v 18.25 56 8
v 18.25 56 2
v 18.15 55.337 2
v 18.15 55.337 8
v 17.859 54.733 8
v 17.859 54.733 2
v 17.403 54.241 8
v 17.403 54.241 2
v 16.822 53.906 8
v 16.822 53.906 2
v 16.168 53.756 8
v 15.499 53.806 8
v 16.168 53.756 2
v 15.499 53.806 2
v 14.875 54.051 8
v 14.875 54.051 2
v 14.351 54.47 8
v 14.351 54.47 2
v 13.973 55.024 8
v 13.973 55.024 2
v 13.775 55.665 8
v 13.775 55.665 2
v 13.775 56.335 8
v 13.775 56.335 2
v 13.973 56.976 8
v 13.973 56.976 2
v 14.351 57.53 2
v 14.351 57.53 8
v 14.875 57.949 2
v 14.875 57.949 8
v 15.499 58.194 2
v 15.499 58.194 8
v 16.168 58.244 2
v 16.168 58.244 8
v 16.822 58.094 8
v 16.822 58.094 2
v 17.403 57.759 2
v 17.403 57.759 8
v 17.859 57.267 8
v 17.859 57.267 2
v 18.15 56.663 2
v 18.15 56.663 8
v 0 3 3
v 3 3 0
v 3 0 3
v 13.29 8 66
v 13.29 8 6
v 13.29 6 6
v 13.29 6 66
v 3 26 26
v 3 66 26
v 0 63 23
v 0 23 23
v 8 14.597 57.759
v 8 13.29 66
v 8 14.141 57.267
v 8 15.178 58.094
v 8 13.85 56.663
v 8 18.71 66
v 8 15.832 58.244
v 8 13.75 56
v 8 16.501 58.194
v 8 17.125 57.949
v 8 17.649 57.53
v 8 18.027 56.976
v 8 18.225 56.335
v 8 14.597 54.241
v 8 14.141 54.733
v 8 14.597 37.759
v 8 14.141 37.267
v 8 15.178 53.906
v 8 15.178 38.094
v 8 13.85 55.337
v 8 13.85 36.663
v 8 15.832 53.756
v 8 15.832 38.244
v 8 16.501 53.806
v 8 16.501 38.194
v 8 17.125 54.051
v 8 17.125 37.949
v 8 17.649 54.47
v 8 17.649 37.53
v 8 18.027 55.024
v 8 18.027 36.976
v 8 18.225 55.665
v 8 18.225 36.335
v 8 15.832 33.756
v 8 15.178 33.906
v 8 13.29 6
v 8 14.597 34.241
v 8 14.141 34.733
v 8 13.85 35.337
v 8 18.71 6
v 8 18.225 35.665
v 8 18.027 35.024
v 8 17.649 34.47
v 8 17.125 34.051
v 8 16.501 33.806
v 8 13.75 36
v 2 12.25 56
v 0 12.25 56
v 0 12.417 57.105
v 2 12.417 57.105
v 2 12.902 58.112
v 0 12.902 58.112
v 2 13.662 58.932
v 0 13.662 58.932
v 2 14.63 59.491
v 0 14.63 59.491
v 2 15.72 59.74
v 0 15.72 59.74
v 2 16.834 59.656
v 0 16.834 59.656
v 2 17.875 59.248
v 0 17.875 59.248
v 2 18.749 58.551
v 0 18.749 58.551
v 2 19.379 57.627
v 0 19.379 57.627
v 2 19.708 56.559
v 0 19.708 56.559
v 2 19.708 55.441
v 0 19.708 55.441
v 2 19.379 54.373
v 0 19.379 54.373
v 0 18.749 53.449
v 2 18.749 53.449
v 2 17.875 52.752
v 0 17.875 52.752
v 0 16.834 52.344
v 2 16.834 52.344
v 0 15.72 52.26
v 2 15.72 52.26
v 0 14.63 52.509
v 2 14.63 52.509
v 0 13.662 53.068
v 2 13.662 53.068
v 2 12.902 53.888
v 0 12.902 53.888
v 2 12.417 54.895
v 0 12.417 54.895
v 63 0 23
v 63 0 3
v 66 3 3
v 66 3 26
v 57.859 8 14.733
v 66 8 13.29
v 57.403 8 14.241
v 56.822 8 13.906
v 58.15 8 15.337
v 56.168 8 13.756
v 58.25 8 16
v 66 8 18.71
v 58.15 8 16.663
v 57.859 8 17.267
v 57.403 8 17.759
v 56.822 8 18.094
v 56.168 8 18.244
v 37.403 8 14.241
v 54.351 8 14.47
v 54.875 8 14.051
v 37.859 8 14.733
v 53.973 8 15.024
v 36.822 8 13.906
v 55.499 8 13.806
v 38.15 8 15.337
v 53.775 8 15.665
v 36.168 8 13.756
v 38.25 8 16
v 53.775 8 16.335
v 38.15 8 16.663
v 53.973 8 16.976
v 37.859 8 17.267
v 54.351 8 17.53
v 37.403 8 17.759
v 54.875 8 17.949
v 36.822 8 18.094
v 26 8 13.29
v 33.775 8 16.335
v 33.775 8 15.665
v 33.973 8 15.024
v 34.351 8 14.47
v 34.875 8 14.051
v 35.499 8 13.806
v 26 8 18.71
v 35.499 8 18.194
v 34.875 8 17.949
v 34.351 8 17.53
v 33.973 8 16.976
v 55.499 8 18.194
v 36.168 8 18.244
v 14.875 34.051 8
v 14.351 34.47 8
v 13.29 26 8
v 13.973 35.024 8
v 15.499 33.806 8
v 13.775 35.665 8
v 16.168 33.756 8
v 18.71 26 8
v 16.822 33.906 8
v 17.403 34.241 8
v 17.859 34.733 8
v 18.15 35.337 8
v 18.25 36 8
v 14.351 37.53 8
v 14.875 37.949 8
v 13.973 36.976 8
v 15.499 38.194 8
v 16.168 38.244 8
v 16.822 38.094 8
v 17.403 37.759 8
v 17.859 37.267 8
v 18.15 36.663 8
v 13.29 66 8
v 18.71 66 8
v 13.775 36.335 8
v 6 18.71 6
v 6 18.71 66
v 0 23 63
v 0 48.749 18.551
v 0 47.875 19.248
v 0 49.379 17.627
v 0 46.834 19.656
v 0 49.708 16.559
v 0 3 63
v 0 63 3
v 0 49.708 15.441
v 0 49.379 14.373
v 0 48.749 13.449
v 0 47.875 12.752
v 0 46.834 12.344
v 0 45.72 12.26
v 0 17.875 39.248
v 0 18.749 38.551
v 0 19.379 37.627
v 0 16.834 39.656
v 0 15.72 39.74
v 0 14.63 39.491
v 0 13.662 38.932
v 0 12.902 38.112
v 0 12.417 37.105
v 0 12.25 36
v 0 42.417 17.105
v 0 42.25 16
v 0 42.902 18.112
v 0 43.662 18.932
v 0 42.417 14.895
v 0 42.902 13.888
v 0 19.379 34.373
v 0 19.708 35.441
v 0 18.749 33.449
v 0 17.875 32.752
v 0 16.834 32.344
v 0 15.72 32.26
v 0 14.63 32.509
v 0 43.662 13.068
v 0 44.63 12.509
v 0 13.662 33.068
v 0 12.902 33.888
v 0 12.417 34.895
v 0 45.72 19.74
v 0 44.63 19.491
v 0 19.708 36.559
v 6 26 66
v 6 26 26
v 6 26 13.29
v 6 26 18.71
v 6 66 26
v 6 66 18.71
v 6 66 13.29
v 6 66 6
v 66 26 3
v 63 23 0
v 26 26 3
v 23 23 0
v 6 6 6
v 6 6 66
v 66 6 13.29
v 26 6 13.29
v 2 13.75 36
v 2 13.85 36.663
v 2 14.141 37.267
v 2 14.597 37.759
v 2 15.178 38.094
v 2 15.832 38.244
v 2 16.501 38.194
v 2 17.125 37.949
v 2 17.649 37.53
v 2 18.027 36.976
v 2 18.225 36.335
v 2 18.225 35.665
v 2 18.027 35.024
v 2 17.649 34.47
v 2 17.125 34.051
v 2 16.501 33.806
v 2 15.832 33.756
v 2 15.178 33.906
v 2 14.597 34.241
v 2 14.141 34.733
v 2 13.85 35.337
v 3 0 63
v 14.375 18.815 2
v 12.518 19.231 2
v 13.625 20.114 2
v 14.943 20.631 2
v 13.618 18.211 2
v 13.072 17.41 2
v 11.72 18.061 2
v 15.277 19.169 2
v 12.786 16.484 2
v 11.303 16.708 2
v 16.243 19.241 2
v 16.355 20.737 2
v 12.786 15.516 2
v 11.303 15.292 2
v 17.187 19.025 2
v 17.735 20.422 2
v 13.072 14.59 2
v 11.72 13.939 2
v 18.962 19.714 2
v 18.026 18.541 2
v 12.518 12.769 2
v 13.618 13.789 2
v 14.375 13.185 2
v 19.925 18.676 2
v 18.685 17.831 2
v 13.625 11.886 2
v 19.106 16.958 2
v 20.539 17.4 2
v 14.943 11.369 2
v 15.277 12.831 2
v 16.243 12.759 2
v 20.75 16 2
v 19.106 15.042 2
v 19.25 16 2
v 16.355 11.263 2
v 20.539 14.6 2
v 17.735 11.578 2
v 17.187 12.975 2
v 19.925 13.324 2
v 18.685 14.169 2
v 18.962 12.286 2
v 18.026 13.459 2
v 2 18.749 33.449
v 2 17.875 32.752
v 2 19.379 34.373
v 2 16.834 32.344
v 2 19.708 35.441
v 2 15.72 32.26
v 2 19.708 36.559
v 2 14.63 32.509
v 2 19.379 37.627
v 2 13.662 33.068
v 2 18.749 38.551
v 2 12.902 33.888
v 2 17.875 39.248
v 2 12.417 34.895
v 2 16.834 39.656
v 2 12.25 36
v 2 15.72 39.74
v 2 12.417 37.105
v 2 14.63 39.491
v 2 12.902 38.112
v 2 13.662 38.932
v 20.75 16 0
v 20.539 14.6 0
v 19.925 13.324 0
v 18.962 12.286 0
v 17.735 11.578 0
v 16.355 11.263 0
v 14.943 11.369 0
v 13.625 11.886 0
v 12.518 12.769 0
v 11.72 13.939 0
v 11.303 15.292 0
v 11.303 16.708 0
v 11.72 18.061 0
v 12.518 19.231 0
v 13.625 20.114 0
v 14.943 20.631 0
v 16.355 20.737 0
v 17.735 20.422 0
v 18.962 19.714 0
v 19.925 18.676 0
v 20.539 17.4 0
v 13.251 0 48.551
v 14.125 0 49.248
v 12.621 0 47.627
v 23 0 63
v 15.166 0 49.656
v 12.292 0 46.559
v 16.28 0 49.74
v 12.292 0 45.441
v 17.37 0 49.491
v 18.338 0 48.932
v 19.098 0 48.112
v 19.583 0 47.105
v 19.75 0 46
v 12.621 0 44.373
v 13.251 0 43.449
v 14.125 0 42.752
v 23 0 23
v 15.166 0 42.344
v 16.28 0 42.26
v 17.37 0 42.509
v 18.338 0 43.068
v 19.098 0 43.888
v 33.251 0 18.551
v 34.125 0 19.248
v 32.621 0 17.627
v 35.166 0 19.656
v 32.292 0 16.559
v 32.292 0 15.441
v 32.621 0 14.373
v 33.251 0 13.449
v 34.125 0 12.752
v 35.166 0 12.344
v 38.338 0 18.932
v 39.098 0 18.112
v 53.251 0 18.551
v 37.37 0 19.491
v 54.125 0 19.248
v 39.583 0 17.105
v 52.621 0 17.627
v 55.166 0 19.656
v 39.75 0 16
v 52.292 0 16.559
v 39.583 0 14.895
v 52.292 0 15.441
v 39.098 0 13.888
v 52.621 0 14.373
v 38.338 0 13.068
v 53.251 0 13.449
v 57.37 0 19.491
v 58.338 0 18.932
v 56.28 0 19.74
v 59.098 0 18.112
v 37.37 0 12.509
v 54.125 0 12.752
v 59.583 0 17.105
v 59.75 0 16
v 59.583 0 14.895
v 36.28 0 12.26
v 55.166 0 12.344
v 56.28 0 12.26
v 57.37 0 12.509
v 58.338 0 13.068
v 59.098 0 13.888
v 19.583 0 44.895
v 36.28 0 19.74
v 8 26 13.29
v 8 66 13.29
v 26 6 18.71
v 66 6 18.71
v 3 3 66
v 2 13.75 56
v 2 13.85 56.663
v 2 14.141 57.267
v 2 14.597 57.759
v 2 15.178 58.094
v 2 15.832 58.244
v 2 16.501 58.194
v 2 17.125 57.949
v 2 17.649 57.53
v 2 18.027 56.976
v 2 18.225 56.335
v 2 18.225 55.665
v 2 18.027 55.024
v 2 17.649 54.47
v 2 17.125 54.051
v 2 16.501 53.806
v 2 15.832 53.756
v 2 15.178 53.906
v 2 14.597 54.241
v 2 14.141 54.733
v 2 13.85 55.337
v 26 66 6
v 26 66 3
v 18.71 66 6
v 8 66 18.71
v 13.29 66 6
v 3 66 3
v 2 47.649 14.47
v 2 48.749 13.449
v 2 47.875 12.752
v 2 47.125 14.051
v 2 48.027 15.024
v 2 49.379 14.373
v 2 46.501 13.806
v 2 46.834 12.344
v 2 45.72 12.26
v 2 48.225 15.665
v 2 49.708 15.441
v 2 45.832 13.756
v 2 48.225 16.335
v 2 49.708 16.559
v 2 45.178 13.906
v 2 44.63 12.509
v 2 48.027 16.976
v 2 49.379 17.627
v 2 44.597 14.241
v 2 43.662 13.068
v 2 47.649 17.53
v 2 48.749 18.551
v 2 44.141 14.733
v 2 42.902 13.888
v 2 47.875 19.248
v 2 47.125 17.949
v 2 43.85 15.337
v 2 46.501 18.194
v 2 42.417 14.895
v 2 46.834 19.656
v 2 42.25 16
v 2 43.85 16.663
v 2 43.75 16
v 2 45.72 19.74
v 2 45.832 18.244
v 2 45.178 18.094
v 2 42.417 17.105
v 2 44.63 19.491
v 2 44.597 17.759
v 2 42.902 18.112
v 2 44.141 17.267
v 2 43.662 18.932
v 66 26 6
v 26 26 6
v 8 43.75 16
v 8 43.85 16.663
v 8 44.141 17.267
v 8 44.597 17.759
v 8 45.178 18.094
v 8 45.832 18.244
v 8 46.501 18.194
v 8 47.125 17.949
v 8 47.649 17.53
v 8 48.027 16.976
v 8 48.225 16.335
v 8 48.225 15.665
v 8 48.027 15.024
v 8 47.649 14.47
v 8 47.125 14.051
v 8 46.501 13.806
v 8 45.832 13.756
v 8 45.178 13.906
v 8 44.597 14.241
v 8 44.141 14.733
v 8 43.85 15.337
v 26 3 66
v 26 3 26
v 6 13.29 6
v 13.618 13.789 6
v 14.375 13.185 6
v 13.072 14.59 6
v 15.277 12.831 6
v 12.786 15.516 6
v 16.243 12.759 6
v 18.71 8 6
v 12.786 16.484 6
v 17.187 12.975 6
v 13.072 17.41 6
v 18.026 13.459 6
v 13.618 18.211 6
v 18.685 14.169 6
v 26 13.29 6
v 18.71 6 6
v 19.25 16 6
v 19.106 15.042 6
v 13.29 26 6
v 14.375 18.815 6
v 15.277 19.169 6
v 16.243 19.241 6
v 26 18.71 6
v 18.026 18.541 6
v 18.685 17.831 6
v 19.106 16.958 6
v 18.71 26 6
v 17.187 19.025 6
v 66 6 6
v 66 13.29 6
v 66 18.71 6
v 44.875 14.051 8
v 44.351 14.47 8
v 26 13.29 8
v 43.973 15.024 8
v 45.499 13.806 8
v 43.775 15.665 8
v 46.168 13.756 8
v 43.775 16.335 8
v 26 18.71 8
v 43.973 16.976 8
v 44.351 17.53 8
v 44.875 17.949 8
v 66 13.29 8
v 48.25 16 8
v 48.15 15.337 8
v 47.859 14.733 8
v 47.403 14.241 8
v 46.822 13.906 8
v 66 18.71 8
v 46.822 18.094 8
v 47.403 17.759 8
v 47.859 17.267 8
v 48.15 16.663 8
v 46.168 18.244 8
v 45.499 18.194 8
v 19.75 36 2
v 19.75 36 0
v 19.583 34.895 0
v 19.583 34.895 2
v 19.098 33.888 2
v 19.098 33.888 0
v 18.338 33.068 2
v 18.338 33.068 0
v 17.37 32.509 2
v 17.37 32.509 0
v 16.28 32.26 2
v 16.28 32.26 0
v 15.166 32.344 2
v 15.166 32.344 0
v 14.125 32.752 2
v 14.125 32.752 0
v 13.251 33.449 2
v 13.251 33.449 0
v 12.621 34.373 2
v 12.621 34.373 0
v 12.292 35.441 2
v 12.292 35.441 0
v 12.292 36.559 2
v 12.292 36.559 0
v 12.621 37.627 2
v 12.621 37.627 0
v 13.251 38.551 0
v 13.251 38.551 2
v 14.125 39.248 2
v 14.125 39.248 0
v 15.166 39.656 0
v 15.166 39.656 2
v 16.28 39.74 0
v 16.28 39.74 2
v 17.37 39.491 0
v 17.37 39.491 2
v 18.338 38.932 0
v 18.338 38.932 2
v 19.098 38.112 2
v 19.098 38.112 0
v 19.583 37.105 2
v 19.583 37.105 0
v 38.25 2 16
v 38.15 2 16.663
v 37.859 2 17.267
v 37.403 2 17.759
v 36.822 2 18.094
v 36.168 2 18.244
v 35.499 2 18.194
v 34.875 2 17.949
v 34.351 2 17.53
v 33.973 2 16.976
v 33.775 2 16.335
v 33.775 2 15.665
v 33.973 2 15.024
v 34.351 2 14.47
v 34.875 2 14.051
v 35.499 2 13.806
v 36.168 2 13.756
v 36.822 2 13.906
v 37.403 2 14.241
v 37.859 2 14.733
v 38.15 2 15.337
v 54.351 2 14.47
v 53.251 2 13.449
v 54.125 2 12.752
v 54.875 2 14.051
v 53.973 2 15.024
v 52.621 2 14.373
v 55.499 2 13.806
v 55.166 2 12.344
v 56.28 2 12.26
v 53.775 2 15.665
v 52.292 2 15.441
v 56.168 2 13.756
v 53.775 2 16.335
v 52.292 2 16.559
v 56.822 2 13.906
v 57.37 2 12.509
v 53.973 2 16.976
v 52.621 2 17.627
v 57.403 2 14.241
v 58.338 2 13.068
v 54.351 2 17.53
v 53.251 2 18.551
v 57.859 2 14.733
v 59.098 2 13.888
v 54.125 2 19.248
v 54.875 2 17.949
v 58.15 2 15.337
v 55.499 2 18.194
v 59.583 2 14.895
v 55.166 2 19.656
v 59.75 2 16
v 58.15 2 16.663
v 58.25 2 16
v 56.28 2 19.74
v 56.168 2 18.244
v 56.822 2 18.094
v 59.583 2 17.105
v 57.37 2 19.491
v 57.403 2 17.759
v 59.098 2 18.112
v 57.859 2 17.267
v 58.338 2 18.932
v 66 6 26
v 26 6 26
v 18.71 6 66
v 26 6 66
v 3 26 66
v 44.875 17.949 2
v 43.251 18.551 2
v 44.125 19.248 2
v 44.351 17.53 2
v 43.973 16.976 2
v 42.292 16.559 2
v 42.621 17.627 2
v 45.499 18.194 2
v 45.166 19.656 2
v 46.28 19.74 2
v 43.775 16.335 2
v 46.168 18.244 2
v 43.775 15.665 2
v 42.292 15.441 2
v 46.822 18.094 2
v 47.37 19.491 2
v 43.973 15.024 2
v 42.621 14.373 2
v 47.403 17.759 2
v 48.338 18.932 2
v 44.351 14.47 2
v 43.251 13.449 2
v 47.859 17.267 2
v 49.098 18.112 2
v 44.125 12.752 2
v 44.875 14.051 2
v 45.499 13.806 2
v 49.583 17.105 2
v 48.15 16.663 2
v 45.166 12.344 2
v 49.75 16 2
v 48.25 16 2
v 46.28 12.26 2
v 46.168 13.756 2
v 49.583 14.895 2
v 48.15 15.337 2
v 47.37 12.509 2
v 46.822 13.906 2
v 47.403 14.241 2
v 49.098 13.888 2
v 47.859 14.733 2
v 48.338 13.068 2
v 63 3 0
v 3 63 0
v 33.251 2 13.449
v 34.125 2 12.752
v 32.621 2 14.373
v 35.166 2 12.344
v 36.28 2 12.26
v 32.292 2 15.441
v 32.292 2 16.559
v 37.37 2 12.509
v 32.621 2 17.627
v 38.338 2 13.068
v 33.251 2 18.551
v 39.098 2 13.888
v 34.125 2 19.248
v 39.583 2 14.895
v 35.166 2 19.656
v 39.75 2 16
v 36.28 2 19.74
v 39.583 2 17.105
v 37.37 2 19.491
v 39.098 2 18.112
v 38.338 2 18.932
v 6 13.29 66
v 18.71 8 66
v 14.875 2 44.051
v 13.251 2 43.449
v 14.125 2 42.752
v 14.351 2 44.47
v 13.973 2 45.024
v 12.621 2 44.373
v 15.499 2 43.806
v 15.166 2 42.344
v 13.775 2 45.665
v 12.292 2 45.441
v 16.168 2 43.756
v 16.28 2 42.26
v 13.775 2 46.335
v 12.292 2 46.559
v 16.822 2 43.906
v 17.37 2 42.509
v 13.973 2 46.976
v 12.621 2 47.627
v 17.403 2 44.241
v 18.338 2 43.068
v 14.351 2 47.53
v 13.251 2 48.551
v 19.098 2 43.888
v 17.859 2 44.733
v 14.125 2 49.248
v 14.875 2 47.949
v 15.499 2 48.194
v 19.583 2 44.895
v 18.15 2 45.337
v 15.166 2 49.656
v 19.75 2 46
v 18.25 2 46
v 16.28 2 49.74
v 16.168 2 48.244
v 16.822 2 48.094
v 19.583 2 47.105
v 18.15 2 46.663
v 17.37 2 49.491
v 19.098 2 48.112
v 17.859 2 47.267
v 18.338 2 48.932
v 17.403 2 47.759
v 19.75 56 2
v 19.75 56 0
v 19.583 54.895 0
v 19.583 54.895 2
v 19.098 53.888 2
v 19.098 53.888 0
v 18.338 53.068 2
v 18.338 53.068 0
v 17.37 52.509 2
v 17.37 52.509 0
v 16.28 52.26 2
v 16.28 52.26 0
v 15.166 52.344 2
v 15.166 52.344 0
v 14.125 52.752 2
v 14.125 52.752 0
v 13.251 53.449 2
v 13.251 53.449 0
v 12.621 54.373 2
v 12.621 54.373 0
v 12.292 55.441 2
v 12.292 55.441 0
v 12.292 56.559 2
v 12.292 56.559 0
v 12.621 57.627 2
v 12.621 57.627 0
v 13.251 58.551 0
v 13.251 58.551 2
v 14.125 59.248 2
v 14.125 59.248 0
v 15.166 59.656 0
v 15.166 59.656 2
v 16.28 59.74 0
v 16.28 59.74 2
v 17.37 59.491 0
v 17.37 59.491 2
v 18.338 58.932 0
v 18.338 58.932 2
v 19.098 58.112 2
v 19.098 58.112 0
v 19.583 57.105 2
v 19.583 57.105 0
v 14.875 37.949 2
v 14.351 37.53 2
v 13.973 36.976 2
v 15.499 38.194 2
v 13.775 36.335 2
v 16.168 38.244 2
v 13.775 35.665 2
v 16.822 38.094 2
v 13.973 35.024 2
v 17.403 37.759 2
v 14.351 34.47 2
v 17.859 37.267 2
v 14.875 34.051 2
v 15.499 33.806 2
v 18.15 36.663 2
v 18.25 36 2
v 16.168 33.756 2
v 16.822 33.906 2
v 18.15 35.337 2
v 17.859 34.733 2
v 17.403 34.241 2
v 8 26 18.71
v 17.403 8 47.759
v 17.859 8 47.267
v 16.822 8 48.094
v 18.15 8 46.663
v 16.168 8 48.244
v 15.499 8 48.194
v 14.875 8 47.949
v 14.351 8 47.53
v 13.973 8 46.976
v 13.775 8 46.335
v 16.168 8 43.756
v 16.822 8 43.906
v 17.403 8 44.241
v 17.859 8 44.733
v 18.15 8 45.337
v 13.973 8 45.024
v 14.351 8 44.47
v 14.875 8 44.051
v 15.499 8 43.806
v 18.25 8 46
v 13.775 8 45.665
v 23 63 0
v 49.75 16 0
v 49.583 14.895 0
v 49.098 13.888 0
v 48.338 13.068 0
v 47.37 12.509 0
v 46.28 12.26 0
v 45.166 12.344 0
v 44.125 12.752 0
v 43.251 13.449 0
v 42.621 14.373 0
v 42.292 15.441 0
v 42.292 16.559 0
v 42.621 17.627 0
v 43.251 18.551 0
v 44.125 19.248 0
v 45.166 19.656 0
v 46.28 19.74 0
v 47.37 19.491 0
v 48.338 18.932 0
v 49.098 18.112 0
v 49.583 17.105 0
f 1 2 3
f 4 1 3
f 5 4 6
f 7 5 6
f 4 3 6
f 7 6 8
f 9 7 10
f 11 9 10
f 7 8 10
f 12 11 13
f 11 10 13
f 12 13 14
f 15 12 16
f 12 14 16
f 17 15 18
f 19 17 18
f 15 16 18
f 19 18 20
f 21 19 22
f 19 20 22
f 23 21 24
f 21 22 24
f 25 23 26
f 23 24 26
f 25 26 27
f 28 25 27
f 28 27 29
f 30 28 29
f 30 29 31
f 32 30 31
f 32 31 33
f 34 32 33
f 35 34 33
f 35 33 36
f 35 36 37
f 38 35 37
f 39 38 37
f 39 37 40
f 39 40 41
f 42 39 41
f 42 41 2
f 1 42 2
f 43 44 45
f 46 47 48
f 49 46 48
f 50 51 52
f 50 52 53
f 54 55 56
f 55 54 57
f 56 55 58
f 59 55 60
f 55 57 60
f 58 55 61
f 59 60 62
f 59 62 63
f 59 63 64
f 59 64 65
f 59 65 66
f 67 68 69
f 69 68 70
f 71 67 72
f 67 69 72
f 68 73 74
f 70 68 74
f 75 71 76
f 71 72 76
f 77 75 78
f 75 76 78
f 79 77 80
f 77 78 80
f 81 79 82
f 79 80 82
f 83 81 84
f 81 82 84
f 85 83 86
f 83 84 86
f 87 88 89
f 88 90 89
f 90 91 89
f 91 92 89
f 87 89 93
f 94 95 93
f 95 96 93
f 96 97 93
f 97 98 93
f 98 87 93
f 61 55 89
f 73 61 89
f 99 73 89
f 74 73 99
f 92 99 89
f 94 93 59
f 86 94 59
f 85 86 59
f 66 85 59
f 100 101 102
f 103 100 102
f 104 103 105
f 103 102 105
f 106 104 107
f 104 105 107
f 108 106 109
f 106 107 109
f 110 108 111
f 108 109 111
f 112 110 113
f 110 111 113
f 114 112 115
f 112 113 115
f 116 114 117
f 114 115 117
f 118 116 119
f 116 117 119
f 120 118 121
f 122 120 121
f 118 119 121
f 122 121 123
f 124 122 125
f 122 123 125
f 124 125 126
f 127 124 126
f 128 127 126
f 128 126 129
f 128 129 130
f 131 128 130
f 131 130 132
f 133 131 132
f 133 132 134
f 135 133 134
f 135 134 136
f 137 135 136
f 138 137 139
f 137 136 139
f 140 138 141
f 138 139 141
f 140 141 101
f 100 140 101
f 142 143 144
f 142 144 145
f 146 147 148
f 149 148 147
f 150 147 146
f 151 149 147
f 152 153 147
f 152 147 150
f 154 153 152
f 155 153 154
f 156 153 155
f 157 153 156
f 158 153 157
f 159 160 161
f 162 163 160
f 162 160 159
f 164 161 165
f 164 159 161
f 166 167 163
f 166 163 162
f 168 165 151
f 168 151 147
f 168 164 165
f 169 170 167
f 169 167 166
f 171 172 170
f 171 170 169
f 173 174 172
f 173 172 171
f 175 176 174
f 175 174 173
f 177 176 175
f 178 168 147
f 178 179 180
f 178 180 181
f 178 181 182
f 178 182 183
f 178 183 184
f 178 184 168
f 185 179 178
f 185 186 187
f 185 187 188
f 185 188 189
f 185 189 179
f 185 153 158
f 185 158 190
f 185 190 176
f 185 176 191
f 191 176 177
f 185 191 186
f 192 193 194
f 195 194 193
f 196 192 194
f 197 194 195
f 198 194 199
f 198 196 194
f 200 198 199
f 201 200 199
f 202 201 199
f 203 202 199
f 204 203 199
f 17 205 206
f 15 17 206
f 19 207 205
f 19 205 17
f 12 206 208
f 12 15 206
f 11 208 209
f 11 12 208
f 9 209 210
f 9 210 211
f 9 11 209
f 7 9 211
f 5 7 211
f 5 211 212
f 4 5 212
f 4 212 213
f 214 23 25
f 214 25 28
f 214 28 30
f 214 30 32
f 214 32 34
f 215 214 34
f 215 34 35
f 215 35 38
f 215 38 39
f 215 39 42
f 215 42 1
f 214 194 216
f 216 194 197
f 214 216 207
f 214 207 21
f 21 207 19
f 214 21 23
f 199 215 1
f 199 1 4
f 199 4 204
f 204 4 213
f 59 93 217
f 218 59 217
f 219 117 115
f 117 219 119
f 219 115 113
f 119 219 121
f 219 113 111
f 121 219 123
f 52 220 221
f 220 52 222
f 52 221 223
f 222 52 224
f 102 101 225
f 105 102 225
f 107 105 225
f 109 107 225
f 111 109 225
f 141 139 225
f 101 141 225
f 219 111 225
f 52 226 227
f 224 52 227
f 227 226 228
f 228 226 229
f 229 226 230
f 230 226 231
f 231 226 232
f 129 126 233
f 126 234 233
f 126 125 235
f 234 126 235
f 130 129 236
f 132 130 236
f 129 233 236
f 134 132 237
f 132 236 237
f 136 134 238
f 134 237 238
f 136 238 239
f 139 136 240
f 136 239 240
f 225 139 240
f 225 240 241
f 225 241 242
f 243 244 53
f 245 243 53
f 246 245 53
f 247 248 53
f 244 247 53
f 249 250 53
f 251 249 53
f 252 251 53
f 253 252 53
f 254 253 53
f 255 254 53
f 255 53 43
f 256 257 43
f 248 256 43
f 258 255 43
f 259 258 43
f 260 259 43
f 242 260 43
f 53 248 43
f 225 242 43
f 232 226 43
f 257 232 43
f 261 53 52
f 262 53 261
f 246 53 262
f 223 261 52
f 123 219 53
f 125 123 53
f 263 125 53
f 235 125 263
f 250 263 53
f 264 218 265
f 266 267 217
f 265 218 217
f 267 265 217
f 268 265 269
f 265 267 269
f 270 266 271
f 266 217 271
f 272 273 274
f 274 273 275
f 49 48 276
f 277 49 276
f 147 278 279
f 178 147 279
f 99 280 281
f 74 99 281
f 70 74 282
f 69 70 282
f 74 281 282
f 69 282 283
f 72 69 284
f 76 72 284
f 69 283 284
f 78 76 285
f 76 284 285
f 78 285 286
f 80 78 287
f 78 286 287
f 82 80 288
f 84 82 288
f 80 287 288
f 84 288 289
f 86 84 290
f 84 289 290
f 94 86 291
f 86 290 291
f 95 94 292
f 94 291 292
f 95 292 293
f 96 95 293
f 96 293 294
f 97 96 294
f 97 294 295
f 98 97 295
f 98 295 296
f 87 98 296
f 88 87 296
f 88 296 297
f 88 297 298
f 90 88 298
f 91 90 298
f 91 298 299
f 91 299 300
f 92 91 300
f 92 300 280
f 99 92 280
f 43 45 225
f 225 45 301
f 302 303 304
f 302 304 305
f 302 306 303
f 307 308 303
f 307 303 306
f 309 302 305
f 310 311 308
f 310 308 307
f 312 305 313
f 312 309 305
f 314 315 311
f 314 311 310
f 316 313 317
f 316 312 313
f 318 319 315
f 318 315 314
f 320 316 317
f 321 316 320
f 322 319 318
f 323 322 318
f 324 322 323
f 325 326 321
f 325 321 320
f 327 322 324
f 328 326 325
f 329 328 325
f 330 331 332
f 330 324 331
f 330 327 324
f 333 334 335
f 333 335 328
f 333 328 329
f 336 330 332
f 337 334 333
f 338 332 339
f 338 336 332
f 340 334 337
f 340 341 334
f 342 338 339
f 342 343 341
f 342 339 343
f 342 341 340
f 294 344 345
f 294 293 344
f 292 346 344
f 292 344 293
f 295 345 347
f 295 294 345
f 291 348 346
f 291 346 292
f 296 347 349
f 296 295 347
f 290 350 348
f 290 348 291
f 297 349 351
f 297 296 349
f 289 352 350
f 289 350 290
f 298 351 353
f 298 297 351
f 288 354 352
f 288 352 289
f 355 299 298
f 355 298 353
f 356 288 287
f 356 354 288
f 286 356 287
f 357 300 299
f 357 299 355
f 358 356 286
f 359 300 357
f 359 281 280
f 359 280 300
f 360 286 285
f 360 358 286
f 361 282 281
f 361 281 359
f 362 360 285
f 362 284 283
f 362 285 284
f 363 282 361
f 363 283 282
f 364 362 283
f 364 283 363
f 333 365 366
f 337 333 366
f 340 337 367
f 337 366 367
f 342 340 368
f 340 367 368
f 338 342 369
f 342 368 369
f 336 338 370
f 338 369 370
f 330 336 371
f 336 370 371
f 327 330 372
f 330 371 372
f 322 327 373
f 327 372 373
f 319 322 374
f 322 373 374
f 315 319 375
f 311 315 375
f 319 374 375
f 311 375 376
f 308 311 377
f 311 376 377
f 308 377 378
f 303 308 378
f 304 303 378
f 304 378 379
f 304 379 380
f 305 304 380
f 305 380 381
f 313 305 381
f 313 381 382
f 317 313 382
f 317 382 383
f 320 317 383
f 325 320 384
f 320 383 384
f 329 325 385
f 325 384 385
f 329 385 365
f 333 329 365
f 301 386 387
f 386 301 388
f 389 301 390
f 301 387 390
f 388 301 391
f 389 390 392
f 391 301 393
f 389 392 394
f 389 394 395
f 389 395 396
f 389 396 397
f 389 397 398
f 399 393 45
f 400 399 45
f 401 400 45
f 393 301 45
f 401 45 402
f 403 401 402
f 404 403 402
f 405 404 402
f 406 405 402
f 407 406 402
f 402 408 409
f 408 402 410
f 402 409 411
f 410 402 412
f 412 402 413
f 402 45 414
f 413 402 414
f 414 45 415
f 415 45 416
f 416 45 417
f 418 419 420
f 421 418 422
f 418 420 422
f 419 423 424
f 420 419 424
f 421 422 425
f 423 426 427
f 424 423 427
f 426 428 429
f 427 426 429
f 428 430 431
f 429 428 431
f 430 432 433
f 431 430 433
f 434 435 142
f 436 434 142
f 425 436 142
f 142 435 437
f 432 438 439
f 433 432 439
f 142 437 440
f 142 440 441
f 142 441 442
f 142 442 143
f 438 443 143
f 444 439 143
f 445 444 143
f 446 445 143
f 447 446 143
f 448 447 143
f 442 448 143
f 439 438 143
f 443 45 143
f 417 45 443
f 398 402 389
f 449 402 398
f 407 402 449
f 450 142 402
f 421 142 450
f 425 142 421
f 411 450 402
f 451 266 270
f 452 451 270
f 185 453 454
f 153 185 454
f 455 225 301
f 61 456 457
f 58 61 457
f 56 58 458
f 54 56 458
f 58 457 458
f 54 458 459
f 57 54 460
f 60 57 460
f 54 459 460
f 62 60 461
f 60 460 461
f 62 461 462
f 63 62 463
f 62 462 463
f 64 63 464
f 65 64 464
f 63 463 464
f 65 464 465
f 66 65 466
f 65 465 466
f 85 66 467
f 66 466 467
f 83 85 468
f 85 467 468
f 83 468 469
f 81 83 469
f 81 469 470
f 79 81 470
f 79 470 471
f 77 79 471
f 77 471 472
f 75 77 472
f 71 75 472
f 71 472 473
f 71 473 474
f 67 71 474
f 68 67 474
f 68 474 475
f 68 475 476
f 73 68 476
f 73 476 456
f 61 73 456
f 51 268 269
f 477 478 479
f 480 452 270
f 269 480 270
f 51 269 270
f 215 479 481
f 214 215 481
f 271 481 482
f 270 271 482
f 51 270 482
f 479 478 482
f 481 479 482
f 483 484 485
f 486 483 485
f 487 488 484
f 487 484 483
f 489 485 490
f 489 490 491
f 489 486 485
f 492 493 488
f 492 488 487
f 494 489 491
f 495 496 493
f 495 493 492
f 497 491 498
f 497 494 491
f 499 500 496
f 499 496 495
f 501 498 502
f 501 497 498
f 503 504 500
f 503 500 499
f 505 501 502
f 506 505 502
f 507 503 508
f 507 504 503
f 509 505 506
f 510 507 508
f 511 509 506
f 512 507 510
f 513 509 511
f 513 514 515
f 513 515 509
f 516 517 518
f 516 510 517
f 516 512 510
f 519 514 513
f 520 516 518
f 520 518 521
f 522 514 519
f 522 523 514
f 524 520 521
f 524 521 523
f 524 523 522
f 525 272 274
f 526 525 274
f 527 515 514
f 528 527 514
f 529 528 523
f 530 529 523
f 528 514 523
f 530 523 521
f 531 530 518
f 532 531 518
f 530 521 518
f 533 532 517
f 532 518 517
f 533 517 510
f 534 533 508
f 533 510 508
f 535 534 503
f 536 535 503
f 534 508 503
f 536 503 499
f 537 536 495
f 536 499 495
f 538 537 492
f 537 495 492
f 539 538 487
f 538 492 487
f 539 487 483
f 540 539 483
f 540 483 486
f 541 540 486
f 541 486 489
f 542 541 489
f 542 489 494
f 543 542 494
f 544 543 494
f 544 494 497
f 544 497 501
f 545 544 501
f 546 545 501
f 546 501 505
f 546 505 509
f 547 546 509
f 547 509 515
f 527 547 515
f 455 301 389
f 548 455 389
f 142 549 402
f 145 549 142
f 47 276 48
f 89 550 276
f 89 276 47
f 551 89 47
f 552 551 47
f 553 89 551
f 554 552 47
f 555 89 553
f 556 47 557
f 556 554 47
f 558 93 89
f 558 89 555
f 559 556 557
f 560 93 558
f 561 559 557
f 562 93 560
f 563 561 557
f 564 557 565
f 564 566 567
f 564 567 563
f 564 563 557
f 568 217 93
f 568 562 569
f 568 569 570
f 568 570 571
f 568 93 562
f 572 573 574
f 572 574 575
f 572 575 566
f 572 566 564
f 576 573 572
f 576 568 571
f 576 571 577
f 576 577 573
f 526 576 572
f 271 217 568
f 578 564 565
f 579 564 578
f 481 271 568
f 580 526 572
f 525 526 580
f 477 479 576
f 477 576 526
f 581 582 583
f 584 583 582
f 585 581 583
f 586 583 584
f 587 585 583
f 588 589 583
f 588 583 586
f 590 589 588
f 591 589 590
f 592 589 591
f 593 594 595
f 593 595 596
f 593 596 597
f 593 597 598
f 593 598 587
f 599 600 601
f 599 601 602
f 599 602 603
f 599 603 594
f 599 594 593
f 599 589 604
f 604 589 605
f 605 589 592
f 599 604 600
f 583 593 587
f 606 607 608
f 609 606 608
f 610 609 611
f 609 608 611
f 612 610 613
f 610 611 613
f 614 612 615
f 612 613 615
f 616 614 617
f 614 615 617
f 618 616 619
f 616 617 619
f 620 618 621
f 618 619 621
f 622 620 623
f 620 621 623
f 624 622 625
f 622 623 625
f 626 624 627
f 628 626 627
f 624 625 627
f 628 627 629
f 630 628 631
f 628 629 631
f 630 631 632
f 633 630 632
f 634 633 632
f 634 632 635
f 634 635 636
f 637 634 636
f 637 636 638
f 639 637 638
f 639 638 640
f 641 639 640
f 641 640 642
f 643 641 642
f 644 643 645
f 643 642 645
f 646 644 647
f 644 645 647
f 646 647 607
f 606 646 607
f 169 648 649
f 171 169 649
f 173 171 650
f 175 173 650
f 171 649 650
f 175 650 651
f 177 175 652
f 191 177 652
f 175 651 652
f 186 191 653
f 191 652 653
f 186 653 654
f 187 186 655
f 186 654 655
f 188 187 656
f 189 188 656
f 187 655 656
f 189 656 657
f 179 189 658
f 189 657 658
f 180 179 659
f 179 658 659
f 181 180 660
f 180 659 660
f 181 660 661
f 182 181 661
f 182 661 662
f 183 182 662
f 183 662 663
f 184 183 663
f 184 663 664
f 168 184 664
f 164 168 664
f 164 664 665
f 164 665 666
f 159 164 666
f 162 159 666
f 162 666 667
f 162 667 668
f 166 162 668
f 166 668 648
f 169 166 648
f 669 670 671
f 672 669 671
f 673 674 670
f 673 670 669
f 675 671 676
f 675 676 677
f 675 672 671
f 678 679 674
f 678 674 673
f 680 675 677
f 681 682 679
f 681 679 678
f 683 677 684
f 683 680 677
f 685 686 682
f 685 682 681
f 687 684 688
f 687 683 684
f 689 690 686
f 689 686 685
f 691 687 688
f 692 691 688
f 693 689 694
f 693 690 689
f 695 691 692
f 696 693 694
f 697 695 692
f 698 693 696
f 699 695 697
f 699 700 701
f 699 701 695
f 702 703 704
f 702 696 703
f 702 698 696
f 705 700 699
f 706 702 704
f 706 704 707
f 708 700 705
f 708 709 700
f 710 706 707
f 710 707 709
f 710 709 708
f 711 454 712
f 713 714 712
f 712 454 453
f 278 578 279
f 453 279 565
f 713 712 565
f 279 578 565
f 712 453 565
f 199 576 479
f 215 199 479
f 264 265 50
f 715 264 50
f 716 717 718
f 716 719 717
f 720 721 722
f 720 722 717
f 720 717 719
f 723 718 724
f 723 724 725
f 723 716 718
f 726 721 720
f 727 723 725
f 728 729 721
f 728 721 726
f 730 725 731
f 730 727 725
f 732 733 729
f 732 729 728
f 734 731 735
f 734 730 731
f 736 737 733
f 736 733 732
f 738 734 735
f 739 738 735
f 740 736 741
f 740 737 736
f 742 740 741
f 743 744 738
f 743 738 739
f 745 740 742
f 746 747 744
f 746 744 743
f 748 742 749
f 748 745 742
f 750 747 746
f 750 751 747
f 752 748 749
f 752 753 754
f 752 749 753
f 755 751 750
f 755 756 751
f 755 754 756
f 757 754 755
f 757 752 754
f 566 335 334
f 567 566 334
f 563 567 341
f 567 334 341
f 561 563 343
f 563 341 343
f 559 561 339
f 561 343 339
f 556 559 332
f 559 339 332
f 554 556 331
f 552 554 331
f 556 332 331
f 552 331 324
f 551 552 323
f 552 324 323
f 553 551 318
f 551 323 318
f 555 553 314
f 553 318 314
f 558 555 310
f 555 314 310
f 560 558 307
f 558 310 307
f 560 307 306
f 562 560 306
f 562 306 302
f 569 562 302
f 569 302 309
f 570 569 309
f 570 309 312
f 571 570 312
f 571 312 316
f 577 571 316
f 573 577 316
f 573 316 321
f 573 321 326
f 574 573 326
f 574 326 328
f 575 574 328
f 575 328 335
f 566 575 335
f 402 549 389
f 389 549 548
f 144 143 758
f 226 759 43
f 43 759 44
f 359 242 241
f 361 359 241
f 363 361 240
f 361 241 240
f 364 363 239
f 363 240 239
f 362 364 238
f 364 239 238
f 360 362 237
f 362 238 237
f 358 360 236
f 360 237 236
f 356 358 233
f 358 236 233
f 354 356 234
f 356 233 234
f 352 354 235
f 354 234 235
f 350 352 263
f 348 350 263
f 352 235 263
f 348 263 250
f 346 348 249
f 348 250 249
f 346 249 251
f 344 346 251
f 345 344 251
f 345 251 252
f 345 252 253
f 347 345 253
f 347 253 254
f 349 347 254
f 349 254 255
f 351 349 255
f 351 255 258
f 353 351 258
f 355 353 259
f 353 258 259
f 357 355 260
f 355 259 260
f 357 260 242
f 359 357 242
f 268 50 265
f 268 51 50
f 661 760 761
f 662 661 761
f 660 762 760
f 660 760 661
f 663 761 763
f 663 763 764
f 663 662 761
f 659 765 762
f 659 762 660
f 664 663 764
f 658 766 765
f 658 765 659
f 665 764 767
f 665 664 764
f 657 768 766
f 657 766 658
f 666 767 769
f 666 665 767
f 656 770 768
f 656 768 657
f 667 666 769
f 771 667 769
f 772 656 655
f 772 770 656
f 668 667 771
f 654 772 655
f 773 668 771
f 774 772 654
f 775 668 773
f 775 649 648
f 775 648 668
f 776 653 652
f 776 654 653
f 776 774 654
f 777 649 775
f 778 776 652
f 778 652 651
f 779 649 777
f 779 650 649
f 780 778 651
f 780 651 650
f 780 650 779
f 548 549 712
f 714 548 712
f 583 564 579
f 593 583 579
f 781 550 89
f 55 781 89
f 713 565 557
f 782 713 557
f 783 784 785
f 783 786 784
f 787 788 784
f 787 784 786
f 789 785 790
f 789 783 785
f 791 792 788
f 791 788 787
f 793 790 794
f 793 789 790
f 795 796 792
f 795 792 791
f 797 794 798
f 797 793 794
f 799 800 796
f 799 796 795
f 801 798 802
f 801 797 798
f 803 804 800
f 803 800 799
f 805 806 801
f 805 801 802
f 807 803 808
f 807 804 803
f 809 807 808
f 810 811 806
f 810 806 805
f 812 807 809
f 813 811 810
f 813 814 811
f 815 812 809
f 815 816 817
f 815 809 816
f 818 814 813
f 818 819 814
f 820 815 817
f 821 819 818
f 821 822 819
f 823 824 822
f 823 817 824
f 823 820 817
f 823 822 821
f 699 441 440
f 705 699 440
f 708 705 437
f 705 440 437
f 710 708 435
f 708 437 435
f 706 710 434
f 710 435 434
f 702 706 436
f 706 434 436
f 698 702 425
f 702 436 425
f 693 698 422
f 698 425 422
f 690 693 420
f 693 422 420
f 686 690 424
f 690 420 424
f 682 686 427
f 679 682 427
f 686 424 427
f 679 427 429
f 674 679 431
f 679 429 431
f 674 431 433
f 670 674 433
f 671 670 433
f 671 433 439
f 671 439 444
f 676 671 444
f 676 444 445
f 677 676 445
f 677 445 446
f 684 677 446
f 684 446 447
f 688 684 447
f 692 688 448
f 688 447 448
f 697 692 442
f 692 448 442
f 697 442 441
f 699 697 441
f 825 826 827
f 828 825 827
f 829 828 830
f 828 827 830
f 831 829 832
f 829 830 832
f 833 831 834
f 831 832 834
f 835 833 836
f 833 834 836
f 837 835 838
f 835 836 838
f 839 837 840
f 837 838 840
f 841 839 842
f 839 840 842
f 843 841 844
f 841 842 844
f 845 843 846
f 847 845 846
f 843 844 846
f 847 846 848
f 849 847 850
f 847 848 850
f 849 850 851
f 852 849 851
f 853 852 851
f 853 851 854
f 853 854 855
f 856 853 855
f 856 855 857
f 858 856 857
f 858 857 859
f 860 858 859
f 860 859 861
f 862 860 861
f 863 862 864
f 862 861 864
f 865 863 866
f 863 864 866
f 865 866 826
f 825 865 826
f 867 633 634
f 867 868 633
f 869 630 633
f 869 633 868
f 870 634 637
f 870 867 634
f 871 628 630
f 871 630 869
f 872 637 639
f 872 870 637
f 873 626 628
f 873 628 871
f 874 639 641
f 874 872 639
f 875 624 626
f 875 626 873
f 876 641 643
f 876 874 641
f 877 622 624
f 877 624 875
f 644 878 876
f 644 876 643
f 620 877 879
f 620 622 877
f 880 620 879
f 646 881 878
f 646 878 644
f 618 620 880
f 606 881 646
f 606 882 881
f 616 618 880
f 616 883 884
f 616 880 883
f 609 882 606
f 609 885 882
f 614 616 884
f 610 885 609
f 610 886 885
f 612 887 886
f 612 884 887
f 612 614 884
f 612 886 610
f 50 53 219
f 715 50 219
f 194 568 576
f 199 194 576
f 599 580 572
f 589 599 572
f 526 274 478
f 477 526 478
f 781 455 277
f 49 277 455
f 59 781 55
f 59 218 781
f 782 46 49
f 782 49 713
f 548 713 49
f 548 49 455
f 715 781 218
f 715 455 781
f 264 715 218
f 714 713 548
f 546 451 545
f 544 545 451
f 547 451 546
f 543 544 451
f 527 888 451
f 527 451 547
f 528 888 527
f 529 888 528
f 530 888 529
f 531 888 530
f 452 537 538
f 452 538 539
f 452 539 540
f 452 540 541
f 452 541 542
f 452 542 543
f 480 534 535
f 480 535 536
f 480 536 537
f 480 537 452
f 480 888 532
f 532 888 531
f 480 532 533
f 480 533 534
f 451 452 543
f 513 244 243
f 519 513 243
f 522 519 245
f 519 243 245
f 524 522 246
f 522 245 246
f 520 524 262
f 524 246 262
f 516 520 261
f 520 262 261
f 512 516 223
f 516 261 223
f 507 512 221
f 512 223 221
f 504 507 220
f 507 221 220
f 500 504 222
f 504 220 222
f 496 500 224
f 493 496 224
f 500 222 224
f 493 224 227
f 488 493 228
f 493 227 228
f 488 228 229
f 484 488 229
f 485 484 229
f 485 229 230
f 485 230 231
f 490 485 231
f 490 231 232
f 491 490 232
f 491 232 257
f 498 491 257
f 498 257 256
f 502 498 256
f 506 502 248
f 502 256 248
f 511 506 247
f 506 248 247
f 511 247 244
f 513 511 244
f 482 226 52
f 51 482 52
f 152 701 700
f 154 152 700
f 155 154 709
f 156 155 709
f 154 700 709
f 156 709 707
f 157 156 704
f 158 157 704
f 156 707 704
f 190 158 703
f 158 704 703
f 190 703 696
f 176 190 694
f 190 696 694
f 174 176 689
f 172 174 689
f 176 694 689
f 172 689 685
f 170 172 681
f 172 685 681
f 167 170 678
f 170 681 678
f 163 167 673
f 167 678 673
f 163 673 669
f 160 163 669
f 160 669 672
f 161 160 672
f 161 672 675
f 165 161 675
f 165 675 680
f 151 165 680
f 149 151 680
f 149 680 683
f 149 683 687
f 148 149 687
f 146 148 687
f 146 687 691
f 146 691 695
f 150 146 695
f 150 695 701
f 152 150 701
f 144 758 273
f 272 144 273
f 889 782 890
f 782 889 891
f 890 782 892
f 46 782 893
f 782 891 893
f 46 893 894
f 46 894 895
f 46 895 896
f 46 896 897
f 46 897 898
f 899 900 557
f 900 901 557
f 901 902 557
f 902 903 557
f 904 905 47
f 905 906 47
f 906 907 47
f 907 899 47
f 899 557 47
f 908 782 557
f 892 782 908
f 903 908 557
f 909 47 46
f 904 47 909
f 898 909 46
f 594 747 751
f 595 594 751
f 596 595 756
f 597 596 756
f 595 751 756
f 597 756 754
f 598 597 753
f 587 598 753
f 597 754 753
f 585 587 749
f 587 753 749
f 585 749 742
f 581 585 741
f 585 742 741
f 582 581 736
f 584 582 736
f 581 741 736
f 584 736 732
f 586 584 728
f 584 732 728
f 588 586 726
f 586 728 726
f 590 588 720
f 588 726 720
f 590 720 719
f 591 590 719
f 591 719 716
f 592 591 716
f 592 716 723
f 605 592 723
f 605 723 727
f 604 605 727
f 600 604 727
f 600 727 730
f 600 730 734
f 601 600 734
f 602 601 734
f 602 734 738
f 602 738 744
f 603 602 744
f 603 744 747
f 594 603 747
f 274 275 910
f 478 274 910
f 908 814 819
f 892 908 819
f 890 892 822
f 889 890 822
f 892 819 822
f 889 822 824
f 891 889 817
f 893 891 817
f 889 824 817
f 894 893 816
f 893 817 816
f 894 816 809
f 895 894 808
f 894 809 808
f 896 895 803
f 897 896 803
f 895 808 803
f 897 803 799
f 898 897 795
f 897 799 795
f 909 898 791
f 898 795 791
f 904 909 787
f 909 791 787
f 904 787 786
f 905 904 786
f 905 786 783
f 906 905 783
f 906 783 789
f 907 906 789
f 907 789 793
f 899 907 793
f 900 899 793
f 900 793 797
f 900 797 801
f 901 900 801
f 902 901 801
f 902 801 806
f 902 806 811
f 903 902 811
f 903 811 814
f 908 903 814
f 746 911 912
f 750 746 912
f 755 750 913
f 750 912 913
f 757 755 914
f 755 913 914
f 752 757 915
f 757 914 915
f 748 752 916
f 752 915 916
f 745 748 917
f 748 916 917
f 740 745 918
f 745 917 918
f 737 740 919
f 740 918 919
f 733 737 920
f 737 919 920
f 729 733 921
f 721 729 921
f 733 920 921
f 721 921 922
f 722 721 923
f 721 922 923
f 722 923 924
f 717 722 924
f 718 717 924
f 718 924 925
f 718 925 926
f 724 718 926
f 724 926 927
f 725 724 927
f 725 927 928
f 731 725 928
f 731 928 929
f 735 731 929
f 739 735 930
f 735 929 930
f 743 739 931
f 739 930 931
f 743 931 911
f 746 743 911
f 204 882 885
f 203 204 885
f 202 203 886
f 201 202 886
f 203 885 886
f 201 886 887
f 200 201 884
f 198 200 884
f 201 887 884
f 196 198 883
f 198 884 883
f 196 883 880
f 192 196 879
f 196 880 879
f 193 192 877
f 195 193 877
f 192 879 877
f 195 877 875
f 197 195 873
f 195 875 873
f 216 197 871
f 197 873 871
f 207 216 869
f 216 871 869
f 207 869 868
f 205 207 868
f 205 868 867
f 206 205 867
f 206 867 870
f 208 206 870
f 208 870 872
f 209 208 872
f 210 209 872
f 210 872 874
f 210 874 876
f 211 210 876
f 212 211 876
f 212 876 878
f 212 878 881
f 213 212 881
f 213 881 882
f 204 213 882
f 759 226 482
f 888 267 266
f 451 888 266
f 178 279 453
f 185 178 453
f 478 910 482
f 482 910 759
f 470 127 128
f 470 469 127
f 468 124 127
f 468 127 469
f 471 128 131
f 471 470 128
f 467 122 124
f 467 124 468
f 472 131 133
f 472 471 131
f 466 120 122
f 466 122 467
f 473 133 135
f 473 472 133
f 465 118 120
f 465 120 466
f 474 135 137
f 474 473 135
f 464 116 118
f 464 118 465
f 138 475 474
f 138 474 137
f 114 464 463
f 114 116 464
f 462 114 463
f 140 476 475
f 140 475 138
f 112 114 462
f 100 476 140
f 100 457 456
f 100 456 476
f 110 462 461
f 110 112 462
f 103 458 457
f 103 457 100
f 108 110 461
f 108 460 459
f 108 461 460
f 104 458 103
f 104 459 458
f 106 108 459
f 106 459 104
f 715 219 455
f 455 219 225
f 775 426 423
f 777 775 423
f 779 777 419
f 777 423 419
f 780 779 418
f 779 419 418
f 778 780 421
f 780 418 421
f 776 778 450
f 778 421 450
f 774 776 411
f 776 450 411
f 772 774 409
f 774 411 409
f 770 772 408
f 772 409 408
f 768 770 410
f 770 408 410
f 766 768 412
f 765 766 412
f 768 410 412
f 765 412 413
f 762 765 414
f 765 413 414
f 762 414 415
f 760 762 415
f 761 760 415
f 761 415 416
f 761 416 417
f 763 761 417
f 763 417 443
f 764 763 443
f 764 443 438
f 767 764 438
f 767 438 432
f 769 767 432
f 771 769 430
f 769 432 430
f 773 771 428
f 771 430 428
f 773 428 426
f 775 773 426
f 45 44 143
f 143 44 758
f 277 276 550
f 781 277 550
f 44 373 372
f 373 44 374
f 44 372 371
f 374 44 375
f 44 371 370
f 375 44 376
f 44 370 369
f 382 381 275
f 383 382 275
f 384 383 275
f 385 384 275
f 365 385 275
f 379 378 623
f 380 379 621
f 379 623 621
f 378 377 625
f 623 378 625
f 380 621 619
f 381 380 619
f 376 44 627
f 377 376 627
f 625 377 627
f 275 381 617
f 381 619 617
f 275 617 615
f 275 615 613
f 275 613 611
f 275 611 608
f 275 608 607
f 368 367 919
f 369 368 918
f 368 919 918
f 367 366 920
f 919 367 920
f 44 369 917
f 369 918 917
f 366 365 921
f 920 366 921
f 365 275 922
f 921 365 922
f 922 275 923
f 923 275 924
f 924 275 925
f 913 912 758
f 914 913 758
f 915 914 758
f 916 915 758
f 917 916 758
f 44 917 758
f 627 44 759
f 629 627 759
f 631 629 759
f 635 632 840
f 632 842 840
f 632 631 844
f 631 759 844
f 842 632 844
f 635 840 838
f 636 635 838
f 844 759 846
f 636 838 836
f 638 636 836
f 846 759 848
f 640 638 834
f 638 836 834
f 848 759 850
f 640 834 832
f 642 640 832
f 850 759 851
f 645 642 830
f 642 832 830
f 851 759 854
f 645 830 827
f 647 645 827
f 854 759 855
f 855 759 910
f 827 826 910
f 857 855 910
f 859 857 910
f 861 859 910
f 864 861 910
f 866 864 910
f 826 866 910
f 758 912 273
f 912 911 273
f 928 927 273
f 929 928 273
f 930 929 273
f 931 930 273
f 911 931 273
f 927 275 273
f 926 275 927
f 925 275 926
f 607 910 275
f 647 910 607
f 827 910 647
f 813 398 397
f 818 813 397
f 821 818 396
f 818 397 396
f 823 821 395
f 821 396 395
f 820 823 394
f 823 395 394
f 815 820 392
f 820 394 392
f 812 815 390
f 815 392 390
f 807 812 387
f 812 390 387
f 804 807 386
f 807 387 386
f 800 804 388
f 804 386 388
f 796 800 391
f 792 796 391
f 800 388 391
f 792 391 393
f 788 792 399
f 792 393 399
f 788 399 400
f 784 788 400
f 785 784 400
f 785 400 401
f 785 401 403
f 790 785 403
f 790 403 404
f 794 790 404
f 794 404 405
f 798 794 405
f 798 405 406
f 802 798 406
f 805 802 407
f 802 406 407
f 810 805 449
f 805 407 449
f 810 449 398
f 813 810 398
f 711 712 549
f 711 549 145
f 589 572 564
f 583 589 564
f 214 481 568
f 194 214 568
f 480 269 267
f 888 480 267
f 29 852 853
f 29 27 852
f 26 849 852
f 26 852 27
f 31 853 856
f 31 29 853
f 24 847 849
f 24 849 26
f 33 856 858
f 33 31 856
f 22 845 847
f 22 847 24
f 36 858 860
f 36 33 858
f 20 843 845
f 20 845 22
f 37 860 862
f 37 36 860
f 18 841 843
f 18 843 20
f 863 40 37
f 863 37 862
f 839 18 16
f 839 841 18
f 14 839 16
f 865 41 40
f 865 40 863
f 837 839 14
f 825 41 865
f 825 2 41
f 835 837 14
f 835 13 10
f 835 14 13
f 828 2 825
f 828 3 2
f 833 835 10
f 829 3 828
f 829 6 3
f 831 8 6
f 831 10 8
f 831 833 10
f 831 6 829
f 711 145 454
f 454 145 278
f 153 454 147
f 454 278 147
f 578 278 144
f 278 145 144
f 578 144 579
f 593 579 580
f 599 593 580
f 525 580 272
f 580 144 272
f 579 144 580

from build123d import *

# Parameters (mm, degrees)
F1_DEPTH  = 6
F3_DEPTH  = 20
F5_DEPTH  = 40
F7_DEPTH  = 60
F9_DEPTH  = 2
F11_DEPTH = 2
F13_DEPTH = 2
F14_R     = 2.25
F15_DEPTH = 8
F16_R     = 2.25
F17_DEPTH = 8
F18_R     = 3.25
F18_R_2   = 2.25
F19_DEPTH = 8.001
F20_R     = 3.75
F21_DEPTH = 2
F22_R     = 3.75
F23_DEPTH = 2
F24_R     = 3.75
F24_R_2   = 4.75
F25_DEPTH = 2
F26_SIZE  = 3


with BuildPart() as f1:
    # F0 (on Top) → F1 (new body)
    with BuildSketch(Plane.XY):
        Polygon((0, 66), (0, 0), (66, 0), (66, 26), (26, 26), (26, 66), align=None)
    extrude(amount=F1_DEPTH)

    # F2 (on face) → F3 (join)
    with BuildSketch(Plane.XY.offset(6)):
        Polygon((6, 66), (0, 66), (0, 0), (66, 0), (66, 6), (6, 6), align=None)
    extrude(amount=F3_DEPTH)

    # F4 (on face) → F5 (join)
    with BuildSketch(Plane.XY.offset(26)):
        Polygon((6, 6), (6, 26), (0, 26), (0, 0), (26, 0), (26, 6), align=None)
    extrude(amount=F5_DEPTH)

    # F6 (on face) → F7 (join)
    with BuildSketch(Plane.XY.offset(6)):
        Polygon((13.29, 6), (16, 6), (18.71, 6), (18.71, 8), (13.29, 8), align=None)
        Polygon((6, 18.71), (6, 16), (6, 13.29), (8, 13.29), (8, 18.71), align=None)
    extrude(amount=F7_DEPTH)

    # F8 (on face) → F9 (join)
    with BuildSketch(Plane.XY.offset(6)):
        Polygon((66, 13.29), (66, 16), (66, 18.71), (26, 18.71), (26, 13.29), align=None)
        Polygon((18.71, 66), (16, 66), (13.29, 66), (13.29, 26), (18.71, 26), align=None)
    extrude(amount=F9_DEPTH)

    # F10 (on face) → F11 (join)
    with BuildSketch(Plane(origin=(0, 6, 0), x_dir=(-1, 0, 0), z_dir=(0, 1, 0))):
        Polygon((-66, 18.71), (-66, 16), (-66, 13.29), (-26, 13.29), (-26, 16), (-26, 18.71), align=None)
    extrude(amount=F11_DEPTH)

    # F12 (on face) → F13 (join)
    with BuildSketch(Plane.YZ.offset(6)):
        Polygon((66, 13.29), (66, 16), (66, 18.71), (26, 18.71), (26, 13.29), align=None)
    extrude(amount=F13_DEPTH)

    # F14 (on face) → F15 (cut, through all)
    with BuildSketch(Plane.XZ):
        with Locations((56, 16)):
            Circle(F14_R)
        with Locations((16, 46)):
            Circle(F14_R)
        with Locations((36, 16)):
            Circle(F14_R)
    extrude(amount=-F15_DEPTH, mode=Mode.SUBTRACT)

    # F16 (on face) → F17 (cut, through all)
    with BuildSketch(Plane(origin=(0, 0, 0), x_dir=(0, -1, 0), z_dir=(-1, 0, 0))):
        with Locations((-16, 56)):
            Circle(F16_R)
        with Locations((-46, 16)):
            Circle(F16_R)
        with Locations((-16, 36)):
            Circle(F16_R)
    extrude(amount=-F17_DEPTH, mode=Mode.SUBTRACT)

    # F18 (on face) → F19 (cut, through all)
    with BuildSketch(Plane(origin=(0, 0, 0), x_dir=(1, 0, 0), z_dir=(0, 0, -1))):
        with Locations((16, -16)):
            Circle(F18_R)
        with Locations((46, -16)):
            Circle(F18_R_2)
        with Locations((16, -56)):
            Circle(F18_R_2)
        with Locations((16, -36)):
            Circle(F18_R_2)
    extrude(amount=-F19_DEPTH, mode=Mode.SUBTRACT)

    # F20 (on face) → F21 (cut)
    with BuildSketch(Plane.XZ):
        with Locations((16, 46)):
            Circle(F20_R)
        with Locations((36, 16)):
            Circle(F20_R)
        with Locations((56, 16)):
            Circle(F20_R)
    extrude(amount=-F21_DEPTH, mode=Mode.SUBTRACT)

    # F22 (on face) → F23 (cut)
    with BuildSketch(Plane(origin=(0, 0, 0), x_dir=(0, -1, 0), z_dir=(-1, 0, 0))):
        with Locations((-16, 56)):
            Circle(F22_R)
        with Locations((-46, 16)):
            Circle(F22_R)
        with Locations((-16, 36)):
            Circle(F22_R)
    extrude(amount=-F23_DEPTH, mode=Mode.SUBTRACT)

    # F24 (on face) → F25 (cut)
    with BuildSketch(Plane(origin=(0, 0, 0), x_dir=(1, 0, 0), z_dir=(0, 0, -1))):
        with Locations((16, -56)):
            Circle(F24_R)
        with Locations((16, -16)):
            Circle(F24_R_2)
        with Locations((46, -16)):
            Circle(F24_R)
        with Locations((16, -36)):
            Circle(F24_R)
    extrude(amount=-F25_DEPTH, mode=Mode.SUBTRACT)

    # F26
    f26_edges = [f1.edges().sort_by_distance(p)[0] for p in [
        (33, 0, 0),
        (0, 33, 0),
        (0, 0, 33),
        (0, 26, 46),
        (0, 46, 26),
        (26, 0, 46),
        (46, 0, 26),
        (0, 13, 66),
        (13, 0, 66),
        (0, 66, 13),
        (13, 66, 0),
        (66, 0, 13),
        (66, 13, 0),
        (46, 26, 0),
        (26, 46, 0),
    ]]
    chamfer(f26_edges, length=F26_SIZE)


solid = f1.part
